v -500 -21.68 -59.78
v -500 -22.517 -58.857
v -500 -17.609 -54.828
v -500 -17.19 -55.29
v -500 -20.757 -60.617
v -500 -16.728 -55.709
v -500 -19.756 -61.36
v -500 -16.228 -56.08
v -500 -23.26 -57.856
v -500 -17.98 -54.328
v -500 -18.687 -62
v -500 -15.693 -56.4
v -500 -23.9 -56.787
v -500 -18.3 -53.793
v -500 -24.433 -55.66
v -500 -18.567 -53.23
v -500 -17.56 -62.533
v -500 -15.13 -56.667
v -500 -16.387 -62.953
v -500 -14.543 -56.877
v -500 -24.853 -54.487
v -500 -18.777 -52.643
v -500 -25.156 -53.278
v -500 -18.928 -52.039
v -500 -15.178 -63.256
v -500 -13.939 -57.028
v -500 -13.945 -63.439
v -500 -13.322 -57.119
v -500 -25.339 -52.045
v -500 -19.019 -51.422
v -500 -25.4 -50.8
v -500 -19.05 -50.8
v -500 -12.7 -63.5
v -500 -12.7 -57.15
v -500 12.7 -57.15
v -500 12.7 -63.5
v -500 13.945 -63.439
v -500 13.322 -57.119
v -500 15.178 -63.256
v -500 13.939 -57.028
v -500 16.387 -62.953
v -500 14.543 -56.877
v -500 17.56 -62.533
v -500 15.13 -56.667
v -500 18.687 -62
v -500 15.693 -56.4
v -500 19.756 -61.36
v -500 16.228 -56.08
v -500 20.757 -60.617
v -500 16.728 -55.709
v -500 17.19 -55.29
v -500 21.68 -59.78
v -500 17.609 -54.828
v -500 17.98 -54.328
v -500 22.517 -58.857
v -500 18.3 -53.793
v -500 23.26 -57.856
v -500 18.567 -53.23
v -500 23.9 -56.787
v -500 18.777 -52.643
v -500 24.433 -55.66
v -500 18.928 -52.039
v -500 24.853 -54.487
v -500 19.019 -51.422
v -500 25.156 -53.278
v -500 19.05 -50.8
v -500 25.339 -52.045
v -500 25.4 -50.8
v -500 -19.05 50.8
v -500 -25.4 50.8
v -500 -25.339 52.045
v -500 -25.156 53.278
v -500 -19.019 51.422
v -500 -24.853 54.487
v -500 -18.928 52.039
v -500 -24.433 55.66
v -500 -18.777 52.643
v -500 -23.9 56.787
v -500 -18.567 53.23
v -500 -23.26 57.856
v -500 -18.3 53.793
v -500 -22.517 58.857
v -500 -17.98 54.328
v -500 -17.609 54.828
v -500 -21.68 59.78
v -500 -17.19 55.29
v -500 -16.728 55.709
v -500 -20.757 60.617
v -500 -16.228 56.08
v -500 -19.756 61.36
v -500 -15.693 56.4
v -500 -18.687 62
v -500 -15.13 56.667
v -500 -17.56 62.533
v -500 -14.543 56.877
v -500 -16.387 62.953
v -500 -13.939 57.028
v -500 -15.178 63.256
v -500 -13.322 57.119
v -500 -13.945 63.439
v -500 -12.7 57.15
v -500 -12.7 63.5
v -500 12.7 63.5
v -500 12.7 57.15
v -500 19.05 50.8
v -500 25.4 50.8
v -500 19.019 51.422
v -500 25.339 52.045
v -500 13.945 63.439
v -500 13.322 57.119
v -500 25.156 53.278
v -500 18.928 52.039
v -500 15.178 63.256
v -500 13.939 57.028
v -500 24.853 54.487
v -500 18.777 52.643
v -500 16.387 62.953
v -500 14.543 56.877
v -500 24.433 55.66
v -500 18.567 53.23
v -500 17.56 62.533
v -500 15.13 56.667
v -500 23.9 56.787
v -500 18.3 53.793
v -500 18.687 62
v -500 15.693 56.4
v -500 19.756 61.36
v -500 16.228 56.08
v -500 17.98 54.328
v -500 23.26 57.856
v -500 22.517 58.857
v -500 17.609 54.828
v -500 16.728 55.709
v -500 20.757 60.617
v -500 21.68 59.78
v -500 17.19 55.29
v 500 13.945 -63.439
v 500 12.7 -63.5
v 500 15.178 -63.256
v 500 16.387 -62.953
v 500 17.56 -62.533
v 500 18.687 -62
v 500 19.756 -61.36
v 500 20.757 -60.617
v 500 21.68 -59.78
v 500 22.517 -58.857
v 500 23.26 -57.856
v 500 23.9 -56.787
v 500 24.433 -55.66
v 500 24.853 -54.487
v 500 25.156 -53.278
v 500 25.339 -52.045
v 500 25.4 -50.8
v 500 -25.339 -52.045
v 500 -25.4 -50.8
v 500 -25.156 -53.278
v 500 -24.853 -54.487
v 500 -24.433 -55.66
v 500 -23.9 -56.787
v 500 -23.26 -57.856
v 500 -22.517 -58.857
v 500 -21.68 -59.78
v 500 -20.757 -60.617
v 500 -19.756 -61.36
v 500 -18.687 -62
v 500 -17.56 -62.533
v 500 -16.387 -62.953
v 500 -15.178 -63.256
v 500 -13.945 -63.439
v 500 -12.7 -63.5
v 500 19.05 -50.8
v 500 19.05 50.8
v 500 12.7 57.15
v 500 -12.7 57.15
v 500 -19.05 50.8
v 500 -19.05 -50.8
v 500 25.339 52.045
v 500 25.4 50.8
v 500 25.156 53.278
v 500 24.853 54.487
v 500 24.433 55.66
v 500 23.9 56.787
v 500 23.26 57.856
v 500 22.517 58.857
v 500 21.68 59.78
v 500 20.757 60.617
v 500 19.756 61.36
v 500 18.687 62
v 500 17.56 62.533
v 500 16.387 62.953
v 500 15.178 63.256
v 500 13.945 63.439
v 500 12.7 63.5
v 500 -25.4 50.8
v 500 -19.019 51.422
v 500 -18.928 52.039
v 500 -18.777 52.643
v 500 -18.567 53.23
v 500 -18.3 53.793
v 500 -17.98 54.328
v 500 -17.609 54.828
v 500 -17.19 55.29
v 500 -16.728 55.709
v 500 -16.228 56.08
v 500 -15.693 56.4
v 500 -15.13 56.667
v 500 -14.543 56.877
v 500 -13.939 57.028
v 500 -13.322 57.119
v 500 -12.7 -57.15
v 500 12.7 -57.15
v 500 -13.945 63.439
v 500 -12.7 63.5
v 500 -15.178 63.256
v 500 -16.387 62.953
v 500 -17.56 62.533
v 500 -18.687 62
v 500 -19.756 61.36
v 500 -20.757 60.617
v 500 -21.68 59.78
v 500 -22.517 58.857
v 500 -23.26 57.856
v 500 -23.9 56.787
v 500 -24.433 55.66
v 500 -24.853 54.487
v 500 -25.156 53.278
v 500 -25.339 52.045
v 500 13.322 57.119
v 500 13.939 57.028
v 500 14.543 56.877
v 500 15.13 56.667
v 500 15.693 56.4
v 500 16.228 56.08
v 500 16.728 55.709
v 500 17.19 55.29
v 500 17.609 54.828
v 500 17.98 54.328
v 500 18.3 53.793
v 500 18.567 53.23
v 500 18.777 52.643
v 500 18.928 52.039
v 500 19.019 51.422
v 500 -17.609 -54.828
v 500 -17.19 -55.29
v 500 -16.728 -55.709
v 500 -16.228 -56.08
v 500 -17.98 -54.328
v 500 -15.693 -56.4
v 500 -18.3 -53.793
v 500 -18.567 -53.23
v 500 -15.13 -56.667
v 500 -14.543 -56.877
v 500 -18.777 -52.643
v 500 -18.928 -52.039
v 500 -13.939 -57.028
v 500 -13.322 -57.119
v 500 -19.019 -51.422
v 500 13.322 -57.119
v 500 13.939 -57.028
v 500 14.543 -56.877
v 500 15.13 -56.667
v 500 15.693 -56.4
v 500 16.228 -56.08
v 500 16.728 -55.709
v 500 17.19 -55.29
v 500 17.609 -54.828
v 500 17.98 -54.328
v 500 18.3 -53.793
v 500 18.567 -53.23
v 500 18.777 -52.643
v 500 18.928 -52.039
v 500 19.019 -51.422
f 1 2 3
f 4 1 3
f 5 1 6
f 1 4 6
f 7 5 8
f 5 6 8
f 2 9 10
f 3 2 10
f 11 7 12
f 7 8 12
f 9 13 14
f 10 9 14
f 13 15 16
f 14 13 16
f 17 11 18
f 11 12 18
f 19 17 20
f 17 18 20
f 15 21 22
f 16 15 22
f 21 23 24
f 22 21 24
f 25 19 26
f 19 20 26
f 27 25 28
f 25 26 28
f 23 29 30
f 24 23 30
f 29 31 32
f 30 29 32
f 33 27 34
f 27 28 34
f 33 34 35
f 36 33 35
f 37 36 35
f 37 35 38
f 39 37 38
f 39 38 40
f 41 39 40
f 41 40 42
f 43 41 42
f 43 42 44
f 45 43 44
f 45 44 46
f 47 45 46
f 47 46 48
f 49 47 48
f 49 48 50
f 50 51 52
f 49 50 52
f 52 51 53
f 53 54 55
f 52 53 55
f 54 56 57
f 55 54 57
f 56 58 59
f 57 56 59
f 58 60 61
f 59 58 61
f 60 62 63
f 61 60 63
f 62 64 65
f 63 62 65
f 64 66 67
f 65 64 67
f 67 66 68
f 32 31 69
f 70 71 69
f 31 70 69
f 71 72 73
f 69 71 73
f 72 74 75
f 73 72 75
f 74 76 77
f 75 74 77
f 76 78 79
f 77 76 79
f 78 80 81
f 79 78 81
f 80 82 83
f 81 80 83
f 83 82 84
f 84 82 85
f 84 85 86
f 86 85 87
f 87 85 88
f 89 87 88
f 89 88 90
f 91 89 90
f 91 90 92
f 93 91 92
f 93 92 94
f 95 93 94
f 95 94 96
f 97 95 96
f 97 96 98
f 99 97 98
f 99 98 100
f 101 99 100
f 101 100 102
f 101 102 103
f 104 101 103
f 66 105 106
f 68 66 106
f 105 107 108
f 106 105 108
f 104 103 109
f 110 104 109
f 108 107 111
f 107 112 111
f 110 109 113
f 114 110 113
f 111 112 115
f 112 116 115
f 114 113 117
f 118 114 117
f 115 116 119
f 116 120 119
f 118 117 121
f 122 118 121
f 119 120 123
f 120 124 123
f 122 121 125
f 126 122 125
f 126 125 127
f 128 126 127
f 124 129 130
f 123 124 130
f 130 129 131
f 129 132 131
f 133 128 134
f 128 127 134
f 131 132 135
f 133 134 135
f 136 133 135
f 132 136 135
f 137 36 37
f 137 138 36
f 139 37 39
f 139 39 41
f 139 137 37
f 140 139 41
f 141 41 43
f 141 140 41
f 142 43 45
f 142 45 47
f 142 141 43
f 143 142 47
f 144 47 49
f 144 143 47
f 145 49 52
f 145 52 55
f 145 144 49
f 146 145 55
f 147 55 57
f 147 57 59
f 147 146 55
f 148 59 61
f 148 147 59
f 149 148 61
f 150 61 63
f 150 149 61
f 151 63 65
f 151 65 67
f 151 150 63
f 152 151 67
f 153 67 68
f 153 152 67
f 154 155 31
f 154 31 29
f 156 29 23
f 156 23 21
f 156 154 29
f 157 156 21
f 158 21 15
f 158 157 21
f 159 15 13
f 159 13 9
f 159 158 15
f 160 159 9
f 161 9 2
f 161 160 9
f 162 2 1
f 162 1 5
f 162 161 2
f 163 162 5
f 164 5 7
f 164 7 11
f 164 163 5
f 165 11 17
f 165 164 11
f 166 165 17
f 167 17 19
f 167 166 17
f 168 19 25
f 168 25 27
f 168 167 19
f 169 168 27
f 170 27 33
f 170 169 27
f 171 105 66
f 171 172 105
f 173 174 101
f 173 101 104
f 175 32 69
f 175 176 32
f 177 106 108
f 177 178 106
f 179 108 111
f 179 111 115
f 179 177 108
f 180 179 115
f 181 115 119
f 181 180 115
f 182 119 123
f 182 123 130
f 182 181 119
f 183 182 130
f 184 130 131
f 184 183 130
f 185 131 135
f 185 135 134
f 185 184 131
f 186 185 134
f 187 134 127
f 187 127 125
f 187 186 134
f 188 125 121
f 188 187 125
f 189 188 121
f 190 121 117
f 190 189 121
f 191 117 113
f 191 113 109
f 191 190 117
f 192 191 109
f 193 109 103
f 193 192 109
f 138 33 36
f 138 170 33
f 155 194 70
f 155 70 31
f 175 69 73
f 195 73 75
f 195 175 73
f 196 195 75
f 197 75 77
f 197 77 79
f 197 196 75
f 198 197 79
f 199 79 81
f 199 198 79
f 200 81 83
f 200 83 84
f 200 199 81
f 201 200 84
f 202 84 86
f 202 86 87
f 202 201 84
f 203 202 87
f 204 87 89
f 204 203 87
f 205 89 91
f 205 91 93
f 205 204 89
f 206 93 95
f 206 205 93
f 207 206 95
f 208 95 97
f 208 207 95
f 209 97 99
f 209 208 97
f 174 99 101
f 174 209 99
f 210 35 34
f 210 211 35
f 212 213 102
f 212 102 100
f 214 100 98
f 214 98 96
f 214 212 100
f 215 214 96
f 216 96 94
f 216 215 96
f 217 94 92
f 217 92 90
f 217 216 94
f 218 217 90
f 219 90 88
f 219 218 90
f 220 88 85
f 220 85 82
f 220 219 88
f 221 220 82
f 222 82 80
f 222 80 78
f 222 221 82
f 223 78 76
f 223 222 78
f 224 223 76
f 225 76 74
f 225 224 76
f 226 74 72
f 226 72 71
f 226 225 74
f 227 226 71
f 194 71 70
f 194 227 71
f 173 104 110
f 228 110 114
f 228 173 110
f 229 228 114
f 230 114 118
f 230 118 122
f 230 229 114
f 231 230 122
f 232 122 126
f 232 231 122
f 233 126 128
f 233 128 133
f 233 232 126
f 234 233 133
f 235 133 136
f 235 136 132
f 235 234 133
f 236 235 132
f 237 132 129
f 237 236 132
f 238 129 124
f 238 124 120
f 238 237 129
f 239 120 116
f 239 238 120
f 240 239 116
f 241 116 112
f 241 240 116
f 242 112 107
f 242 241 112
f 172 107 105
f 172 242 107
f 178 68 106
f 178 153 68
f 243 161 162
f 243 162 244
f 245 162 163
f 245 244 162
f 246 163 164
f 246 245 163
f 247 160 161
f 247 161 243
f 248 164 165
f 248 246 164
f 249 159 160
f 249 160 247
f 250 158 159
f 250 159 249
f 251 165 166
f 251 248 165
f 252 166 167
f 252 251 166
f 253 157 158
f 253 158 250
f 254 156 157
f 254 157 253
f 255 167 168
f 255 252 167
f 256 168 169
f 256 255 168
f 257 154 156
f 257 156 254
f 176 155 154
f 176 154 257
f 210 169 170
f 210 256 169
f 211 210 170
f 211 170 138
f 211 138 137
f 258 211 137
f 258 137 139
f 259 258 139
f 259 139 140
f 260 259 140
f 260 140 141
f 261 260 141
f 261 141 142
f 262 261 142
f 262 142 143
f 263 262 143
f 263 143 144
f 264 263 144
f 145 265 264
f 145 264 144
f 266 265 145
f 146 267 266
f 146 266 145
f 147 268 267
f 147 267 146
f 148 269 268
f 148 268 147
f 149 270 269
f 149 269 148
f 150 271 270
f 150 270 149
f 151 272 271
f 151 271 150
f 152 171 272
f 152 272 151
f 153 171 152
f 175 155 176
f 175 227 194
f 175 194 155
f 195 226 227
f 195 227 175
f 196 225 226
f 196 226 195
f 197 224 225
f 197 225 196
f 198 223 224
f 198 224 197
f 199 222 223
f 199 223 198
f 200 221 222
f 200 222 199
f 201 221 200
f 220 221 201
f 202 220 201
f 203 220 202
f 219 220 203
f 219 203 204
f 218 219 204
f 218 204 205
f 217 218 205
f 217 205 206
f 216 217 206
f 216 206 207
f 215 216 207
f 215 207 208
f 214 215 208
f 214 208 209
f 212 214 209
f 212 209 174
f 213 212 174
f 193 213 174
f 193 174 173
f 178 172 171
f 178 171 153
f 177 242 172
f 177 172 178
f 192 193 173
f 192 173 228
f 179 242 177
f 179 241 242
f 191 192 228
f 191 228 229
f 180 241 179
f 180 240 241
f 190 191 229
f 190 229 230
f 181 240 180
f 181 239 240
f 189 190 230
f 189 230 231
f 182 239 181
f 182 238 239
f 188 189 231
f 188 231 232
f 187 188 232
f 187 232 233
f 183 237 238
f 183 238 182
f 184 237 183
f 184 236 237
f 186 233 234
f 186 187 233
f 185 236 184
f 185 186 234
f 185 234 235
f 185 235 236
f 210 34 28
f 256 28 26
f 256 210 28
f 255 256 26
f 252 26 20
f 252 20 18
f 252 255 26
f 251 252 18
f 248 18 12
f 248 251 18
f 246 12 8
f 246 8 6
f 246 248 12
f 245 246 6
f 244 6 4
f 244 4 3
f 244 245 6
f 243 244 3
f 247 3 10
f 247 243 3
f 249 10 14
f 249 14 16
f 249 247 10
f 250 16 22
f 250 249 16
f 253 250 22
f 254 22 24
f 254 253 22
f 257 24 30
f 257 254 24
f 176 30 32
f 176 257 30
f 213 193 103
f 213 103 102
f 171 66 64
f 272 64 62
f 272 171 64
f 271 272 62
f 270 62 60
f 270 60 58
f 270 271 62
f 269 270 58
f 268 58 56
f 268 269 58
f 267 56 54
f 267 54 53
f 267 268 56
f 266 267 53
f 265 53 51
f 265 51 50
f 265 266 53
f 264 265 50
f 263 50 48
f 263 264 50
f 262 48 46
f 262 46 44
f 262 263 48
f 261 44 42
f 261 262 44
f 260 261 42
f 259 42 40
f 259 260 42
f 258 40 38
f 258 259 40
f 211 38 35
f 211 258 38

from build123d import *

# Parameters (mm, degrees)
F3_DEPTH = 500


with BuildPart() as f3:
    # F2 (on Right) → F3 (new body, symmetric)
    with BuildSketch(Plane.YZ):
        with BuildLine():
            ThreePointArc((25.4, 50.8), (21.680256, 59.780256), (12.7, 63.5))
            Line((12.7, 63.5), (-12.7, 63.5))
            ThreePointArc((-12.7, 63.5), (-21.680256, 59.780256), (-25.4, 50.8))
            Line((-25.4, 50.8), (-25.4, -50.8))
            ThreePointArc((-25.4, -50.8), (-21.680256, -59.780256), (-12.7, -63.5))
            Line((-12.7, -63.5), (12.7, -63.5))
            ThreePointArc((12.7, -63.5), (21.680256, -59.780256), (25.4, -50.8))
            Line((25.4, -50.8), (25.4, 50.8))
        make_face()
        with BuildLine():
            Line((-12.7, 57.15), (12.7, 57.15))
            ThreePointArc((12.7, 57.15), (17.190128, 55.290128), (19.05, 50.8))
            Line((19.05, 50.8), (19.05, -50.8))
            ThreePointArc((19.05, -50.8), (17.190128, -55.290128), (12.7, -57.15))
            Line((12.7, -57.15), (-12.7, -57.15))
            ThreePointArc((-12.7, -57.15), (-17.190128, -55.290128), (-19.05, -50.8))
            Line((-19.05, -50.8), (-19.05, 50.8))
            ThreePointArc((-19.05, 50.8), (-17.190128, 55.290128), (-12.7, 57.15))
        make_face(mode=Mode.SUBTRACT)
    extrude(amount=F3_DEPTH, both=True)


with BuildPart() as f0_1:
    # F0: copy of F3
    add(f3.part)


solid = f3.part
